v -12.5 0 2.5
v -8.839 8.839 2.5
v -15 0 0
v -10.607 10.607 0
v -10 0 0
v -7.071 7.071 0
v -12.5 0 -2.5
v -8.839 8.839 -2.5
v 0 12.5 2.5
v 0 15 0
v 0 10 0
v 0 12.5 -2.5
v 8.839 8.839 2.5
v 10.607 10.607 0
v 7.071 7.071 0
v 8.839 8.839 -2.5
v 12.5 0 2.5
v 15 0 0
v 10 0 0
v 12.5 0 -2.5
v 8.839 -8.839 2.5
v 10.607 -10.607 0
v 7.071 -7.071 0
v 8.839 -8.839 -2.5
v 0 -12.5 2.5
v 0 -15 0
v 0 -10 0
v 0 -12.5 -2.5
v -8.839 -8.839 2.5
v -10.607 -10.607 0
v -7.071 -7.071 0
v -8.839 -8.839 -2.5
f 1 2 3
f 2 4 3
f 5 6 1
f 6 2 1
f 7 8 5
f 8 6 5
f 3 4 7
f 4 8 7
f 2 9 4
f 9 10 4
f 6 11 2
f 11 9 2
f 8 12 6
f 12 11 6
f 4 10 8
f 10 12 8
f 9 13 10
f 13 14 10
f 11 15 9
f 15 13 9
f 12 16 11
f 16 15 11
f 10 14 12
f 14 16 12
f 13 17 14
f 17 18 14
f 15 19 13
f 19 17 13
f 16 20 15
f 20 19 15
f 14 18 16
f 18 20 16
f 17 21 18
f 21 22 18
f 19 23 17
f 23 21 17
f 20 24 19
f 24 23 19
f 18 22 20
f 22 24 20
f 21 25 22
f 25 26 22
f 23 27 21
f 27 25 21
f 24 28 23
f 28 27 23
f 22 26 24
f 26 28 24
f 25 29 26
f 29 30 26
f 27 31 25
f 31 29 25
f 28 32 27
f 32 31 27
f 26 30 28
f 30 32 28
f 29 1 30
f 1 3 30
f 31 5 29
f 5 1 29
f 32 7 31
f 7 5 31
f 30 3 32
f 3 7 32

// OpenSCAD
module torus(
    inner_radius, 
    outer_radius, 
    major_points, 
    minor_points
) {
    rotate_extrude($fn = major_points) {
        translate([(inner_radius + outer_radius) * 0.5, 0, 0]) {
            circle(d = outer_radius - inner_radius, $fn = minor_points);
        }
    }
};

torus(10, 15, 8, 4);
